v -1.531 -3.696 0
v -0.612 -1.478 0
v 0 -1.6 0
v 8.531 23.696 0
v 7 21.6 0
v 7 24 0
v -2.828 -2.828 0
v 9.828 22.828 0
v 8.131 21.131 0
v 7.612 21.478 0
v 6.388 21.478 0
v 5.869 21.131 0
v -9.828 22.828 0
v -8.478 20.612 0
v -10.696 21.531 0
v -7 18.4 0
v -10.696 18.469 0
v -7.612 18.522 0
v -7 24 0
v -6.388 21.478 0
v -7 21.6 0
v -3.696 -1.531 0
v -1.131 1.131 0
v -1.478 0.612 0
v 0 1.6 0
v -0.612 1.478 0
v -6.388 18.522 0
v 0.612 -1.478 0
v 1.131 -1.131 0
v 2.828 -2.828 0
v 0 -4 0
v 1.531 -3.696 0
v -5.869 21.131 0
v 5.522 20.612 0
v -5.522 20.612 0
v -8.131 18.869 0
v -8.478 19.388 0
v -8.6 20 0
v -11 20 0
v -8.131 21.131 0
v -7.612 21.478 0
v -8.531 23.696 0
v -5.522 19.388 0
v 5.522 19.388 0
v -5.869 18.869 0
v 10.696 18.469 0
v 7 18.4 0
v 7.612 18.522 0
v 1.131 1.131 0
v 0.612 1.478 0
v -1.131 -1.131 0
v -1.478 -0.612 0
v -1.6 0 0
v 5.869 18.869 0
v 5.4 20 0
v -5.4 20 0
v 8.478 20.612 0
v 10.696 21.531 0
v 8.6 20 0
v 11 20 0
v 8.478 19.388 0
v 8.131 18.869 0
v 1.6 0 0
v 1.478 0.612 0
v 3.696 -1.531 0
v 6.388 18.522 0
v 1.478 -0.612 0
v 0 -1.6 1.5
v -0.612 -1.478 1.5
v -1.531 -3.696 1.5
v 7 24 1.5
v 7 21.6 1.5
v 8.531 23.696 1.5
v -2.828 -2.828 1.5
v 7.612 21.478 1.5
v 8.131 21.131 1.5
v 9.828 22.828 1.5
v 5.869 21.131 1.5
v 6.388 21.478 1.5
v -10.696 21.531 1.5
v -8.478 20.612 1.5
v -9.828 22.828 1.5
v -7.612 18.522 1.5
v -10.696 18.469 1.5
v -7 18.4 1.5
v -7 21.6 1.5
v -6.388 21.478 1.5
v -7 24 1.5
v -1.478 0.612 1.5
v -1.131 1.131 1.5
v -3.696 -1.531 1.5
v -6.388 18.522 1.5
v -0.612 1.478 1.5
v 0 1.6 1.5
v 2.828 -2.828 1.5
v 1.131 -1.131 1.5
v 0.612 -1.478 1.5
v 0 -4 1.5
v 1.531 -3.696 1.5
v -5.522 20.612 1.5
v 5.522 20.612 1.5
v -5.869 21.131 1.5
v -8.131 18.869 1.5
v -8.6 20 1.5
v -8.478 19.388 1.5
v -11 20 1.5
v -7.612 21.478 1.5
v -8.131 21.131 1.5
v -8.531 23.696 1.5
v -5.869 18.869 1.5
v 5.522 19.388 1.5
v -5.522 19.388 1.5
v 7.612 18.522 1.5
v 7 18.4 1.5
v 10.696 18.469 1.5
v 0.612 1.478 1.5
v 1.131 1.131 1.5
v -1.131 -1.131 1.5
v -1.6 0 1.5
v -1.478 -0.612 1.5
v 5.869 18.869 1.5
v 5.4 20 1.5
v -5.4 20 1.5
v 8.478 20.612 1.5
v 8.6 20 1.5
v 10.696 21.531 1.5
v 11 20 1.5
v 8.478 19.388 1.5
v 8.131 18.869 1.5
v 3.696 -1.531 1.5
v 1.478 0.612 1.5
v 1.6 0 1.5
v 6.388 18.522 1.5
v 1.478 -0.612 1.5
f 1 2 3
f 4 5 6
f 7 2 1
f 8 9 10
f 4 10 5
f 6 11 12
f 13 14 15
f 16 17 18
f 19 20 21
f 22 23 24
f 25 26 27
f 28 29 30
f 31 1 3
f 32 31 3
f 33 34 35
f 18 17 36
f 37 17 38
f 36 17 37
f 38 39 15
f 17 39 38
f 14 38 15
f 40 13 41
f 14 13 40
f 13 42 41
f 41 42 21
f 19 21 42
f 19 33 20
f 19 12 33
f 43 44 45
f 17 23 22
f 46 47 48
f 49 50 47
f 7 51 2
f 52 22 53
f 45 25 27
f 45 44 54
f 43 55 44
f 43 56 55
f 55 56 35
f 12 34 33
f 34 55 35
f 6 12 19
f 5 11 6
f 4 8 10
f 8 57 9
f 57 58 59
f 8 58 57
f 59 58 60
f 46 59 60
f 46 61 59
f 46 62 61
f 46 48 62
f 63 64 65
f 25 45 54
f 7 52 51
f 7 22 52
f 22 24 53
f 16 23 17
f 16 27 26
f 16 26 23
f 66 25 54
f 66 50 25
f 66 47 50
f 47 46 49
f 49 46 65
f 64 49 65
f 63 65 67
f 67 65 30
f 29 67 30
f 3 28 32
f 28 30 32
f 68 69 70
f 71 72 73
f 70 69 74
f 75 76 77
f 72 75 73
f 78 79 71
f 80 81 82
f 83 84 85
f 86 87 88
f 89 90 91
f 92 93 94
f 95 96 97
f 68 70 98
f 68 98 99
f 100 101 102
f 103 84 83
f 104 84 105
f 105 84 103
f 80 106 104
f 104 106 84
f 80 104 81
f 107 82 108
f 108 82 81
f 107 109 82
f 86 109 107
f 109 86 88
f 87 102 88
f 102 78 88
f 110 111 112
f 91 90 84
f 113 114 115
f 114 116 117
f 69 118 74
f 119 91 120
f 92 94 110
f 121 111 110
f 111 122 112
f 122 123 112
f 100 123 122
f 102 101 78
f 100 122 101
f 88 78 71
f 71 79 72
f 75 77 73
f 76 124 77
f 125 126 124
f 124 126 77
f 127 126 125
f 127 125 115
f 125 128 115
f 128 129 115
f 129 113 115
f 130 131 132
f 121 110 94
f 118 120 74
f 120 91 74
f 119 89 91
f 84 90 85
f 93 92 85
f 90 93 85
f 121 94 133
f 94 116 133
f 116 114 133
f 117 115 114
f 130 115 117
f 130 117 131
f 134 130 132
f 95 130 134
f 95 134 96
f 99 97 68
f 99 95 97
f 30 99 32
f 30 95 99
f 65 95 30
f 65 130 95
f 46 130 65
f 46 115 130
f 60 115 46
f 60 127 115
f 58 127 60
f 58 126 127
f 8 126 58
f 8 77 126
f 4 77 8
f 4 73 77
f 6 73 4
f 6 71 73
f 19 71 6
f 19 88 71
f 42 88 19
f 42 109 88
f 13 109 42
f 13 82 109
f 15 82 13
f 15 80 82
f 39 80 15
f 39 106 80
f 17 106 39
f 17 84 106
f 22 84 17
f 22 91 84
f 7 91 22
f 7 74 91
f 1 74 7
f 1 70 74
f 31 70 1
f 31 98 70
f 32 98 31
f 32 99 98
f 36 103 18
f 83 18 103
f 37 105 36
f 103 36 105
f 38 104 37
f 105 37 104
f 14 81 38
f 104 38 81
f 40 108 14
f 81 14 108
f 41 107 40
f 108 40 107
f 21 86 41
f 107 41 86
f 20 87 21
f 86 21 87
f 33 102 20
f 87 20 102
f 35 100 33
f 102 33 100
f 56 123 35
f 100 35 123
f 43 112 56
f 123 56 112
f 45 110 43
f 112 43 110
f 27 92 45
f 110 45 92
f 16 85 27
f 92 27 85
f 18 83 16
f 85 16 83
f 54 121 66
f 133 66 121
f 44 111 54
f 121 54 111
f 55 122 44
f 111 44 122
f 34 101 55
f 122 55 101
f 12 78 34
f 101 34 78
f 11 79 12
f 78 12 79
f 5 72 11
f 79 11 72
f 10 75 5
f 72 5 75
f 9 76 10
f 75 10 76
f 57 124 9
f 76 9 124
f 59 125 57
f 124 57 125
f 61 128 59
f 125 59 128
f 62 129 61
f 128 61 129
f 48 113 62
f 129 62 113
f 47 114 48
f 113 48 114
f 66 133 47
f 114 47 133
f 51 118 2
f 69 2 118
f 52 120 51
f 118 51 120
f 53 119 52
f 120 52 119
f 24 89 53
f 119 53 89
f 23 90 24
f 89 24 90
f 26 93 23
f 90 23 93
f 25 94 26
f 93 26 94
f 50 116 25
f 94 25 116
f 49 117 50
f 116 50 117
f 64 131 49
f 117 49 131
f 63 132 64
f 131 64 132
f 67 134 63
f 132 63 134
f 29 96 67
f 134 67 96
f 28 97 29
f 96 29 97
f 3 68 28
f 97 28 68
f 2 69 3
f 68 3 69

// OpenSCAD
// file: dimensions.scad
internal_height = 60;

plate_width = 280;
plate_vertex_radius = 15;

pillar_offset = (plate_width / 2) - 12;
side_panel_offset = 124.5;

top_plate_thickness = 3;
bottom_plate_thickness = 5;
side_panel_thickness = 3;

side_panel_width = 94;
side_panel_tab_width = 15;
side_panel_tab_offset = 40;

card_reader_spacer_thickness = 1.5;
card_reader_offset = 70;
card_reader_mounting_holes = [[0, 0], [-7, 20], [7, 20]];

control_board_spacer_thickness = 3;
control_board_offset = (70 / 2) - 5;
control_board_mounting_holes = [[-38 / 2, 0], [38 / 2, 0]];

led_ring_mount_offset = 152 / 2;
// main file
include <dimensions.scad>;

module CardReaderSpacer() {
    difference() {
        hull() {
            for(h = card_reader_mounting_holes) {
                translate(h) {
                    circle(d = 8, $fn = 16);
                }
            }
        }

        for(h = card_reader_mounting_holes) {
            translate(h) {
                circle(d = 3.2, $fn = 16);
            }
        }
    }
}

module CardReaderSpacer3D() {
    linear_extrude(card_reader_spacer_thickness) {
        CardReaderSpacer();
    }
}

CardReaderSpacer3D();
